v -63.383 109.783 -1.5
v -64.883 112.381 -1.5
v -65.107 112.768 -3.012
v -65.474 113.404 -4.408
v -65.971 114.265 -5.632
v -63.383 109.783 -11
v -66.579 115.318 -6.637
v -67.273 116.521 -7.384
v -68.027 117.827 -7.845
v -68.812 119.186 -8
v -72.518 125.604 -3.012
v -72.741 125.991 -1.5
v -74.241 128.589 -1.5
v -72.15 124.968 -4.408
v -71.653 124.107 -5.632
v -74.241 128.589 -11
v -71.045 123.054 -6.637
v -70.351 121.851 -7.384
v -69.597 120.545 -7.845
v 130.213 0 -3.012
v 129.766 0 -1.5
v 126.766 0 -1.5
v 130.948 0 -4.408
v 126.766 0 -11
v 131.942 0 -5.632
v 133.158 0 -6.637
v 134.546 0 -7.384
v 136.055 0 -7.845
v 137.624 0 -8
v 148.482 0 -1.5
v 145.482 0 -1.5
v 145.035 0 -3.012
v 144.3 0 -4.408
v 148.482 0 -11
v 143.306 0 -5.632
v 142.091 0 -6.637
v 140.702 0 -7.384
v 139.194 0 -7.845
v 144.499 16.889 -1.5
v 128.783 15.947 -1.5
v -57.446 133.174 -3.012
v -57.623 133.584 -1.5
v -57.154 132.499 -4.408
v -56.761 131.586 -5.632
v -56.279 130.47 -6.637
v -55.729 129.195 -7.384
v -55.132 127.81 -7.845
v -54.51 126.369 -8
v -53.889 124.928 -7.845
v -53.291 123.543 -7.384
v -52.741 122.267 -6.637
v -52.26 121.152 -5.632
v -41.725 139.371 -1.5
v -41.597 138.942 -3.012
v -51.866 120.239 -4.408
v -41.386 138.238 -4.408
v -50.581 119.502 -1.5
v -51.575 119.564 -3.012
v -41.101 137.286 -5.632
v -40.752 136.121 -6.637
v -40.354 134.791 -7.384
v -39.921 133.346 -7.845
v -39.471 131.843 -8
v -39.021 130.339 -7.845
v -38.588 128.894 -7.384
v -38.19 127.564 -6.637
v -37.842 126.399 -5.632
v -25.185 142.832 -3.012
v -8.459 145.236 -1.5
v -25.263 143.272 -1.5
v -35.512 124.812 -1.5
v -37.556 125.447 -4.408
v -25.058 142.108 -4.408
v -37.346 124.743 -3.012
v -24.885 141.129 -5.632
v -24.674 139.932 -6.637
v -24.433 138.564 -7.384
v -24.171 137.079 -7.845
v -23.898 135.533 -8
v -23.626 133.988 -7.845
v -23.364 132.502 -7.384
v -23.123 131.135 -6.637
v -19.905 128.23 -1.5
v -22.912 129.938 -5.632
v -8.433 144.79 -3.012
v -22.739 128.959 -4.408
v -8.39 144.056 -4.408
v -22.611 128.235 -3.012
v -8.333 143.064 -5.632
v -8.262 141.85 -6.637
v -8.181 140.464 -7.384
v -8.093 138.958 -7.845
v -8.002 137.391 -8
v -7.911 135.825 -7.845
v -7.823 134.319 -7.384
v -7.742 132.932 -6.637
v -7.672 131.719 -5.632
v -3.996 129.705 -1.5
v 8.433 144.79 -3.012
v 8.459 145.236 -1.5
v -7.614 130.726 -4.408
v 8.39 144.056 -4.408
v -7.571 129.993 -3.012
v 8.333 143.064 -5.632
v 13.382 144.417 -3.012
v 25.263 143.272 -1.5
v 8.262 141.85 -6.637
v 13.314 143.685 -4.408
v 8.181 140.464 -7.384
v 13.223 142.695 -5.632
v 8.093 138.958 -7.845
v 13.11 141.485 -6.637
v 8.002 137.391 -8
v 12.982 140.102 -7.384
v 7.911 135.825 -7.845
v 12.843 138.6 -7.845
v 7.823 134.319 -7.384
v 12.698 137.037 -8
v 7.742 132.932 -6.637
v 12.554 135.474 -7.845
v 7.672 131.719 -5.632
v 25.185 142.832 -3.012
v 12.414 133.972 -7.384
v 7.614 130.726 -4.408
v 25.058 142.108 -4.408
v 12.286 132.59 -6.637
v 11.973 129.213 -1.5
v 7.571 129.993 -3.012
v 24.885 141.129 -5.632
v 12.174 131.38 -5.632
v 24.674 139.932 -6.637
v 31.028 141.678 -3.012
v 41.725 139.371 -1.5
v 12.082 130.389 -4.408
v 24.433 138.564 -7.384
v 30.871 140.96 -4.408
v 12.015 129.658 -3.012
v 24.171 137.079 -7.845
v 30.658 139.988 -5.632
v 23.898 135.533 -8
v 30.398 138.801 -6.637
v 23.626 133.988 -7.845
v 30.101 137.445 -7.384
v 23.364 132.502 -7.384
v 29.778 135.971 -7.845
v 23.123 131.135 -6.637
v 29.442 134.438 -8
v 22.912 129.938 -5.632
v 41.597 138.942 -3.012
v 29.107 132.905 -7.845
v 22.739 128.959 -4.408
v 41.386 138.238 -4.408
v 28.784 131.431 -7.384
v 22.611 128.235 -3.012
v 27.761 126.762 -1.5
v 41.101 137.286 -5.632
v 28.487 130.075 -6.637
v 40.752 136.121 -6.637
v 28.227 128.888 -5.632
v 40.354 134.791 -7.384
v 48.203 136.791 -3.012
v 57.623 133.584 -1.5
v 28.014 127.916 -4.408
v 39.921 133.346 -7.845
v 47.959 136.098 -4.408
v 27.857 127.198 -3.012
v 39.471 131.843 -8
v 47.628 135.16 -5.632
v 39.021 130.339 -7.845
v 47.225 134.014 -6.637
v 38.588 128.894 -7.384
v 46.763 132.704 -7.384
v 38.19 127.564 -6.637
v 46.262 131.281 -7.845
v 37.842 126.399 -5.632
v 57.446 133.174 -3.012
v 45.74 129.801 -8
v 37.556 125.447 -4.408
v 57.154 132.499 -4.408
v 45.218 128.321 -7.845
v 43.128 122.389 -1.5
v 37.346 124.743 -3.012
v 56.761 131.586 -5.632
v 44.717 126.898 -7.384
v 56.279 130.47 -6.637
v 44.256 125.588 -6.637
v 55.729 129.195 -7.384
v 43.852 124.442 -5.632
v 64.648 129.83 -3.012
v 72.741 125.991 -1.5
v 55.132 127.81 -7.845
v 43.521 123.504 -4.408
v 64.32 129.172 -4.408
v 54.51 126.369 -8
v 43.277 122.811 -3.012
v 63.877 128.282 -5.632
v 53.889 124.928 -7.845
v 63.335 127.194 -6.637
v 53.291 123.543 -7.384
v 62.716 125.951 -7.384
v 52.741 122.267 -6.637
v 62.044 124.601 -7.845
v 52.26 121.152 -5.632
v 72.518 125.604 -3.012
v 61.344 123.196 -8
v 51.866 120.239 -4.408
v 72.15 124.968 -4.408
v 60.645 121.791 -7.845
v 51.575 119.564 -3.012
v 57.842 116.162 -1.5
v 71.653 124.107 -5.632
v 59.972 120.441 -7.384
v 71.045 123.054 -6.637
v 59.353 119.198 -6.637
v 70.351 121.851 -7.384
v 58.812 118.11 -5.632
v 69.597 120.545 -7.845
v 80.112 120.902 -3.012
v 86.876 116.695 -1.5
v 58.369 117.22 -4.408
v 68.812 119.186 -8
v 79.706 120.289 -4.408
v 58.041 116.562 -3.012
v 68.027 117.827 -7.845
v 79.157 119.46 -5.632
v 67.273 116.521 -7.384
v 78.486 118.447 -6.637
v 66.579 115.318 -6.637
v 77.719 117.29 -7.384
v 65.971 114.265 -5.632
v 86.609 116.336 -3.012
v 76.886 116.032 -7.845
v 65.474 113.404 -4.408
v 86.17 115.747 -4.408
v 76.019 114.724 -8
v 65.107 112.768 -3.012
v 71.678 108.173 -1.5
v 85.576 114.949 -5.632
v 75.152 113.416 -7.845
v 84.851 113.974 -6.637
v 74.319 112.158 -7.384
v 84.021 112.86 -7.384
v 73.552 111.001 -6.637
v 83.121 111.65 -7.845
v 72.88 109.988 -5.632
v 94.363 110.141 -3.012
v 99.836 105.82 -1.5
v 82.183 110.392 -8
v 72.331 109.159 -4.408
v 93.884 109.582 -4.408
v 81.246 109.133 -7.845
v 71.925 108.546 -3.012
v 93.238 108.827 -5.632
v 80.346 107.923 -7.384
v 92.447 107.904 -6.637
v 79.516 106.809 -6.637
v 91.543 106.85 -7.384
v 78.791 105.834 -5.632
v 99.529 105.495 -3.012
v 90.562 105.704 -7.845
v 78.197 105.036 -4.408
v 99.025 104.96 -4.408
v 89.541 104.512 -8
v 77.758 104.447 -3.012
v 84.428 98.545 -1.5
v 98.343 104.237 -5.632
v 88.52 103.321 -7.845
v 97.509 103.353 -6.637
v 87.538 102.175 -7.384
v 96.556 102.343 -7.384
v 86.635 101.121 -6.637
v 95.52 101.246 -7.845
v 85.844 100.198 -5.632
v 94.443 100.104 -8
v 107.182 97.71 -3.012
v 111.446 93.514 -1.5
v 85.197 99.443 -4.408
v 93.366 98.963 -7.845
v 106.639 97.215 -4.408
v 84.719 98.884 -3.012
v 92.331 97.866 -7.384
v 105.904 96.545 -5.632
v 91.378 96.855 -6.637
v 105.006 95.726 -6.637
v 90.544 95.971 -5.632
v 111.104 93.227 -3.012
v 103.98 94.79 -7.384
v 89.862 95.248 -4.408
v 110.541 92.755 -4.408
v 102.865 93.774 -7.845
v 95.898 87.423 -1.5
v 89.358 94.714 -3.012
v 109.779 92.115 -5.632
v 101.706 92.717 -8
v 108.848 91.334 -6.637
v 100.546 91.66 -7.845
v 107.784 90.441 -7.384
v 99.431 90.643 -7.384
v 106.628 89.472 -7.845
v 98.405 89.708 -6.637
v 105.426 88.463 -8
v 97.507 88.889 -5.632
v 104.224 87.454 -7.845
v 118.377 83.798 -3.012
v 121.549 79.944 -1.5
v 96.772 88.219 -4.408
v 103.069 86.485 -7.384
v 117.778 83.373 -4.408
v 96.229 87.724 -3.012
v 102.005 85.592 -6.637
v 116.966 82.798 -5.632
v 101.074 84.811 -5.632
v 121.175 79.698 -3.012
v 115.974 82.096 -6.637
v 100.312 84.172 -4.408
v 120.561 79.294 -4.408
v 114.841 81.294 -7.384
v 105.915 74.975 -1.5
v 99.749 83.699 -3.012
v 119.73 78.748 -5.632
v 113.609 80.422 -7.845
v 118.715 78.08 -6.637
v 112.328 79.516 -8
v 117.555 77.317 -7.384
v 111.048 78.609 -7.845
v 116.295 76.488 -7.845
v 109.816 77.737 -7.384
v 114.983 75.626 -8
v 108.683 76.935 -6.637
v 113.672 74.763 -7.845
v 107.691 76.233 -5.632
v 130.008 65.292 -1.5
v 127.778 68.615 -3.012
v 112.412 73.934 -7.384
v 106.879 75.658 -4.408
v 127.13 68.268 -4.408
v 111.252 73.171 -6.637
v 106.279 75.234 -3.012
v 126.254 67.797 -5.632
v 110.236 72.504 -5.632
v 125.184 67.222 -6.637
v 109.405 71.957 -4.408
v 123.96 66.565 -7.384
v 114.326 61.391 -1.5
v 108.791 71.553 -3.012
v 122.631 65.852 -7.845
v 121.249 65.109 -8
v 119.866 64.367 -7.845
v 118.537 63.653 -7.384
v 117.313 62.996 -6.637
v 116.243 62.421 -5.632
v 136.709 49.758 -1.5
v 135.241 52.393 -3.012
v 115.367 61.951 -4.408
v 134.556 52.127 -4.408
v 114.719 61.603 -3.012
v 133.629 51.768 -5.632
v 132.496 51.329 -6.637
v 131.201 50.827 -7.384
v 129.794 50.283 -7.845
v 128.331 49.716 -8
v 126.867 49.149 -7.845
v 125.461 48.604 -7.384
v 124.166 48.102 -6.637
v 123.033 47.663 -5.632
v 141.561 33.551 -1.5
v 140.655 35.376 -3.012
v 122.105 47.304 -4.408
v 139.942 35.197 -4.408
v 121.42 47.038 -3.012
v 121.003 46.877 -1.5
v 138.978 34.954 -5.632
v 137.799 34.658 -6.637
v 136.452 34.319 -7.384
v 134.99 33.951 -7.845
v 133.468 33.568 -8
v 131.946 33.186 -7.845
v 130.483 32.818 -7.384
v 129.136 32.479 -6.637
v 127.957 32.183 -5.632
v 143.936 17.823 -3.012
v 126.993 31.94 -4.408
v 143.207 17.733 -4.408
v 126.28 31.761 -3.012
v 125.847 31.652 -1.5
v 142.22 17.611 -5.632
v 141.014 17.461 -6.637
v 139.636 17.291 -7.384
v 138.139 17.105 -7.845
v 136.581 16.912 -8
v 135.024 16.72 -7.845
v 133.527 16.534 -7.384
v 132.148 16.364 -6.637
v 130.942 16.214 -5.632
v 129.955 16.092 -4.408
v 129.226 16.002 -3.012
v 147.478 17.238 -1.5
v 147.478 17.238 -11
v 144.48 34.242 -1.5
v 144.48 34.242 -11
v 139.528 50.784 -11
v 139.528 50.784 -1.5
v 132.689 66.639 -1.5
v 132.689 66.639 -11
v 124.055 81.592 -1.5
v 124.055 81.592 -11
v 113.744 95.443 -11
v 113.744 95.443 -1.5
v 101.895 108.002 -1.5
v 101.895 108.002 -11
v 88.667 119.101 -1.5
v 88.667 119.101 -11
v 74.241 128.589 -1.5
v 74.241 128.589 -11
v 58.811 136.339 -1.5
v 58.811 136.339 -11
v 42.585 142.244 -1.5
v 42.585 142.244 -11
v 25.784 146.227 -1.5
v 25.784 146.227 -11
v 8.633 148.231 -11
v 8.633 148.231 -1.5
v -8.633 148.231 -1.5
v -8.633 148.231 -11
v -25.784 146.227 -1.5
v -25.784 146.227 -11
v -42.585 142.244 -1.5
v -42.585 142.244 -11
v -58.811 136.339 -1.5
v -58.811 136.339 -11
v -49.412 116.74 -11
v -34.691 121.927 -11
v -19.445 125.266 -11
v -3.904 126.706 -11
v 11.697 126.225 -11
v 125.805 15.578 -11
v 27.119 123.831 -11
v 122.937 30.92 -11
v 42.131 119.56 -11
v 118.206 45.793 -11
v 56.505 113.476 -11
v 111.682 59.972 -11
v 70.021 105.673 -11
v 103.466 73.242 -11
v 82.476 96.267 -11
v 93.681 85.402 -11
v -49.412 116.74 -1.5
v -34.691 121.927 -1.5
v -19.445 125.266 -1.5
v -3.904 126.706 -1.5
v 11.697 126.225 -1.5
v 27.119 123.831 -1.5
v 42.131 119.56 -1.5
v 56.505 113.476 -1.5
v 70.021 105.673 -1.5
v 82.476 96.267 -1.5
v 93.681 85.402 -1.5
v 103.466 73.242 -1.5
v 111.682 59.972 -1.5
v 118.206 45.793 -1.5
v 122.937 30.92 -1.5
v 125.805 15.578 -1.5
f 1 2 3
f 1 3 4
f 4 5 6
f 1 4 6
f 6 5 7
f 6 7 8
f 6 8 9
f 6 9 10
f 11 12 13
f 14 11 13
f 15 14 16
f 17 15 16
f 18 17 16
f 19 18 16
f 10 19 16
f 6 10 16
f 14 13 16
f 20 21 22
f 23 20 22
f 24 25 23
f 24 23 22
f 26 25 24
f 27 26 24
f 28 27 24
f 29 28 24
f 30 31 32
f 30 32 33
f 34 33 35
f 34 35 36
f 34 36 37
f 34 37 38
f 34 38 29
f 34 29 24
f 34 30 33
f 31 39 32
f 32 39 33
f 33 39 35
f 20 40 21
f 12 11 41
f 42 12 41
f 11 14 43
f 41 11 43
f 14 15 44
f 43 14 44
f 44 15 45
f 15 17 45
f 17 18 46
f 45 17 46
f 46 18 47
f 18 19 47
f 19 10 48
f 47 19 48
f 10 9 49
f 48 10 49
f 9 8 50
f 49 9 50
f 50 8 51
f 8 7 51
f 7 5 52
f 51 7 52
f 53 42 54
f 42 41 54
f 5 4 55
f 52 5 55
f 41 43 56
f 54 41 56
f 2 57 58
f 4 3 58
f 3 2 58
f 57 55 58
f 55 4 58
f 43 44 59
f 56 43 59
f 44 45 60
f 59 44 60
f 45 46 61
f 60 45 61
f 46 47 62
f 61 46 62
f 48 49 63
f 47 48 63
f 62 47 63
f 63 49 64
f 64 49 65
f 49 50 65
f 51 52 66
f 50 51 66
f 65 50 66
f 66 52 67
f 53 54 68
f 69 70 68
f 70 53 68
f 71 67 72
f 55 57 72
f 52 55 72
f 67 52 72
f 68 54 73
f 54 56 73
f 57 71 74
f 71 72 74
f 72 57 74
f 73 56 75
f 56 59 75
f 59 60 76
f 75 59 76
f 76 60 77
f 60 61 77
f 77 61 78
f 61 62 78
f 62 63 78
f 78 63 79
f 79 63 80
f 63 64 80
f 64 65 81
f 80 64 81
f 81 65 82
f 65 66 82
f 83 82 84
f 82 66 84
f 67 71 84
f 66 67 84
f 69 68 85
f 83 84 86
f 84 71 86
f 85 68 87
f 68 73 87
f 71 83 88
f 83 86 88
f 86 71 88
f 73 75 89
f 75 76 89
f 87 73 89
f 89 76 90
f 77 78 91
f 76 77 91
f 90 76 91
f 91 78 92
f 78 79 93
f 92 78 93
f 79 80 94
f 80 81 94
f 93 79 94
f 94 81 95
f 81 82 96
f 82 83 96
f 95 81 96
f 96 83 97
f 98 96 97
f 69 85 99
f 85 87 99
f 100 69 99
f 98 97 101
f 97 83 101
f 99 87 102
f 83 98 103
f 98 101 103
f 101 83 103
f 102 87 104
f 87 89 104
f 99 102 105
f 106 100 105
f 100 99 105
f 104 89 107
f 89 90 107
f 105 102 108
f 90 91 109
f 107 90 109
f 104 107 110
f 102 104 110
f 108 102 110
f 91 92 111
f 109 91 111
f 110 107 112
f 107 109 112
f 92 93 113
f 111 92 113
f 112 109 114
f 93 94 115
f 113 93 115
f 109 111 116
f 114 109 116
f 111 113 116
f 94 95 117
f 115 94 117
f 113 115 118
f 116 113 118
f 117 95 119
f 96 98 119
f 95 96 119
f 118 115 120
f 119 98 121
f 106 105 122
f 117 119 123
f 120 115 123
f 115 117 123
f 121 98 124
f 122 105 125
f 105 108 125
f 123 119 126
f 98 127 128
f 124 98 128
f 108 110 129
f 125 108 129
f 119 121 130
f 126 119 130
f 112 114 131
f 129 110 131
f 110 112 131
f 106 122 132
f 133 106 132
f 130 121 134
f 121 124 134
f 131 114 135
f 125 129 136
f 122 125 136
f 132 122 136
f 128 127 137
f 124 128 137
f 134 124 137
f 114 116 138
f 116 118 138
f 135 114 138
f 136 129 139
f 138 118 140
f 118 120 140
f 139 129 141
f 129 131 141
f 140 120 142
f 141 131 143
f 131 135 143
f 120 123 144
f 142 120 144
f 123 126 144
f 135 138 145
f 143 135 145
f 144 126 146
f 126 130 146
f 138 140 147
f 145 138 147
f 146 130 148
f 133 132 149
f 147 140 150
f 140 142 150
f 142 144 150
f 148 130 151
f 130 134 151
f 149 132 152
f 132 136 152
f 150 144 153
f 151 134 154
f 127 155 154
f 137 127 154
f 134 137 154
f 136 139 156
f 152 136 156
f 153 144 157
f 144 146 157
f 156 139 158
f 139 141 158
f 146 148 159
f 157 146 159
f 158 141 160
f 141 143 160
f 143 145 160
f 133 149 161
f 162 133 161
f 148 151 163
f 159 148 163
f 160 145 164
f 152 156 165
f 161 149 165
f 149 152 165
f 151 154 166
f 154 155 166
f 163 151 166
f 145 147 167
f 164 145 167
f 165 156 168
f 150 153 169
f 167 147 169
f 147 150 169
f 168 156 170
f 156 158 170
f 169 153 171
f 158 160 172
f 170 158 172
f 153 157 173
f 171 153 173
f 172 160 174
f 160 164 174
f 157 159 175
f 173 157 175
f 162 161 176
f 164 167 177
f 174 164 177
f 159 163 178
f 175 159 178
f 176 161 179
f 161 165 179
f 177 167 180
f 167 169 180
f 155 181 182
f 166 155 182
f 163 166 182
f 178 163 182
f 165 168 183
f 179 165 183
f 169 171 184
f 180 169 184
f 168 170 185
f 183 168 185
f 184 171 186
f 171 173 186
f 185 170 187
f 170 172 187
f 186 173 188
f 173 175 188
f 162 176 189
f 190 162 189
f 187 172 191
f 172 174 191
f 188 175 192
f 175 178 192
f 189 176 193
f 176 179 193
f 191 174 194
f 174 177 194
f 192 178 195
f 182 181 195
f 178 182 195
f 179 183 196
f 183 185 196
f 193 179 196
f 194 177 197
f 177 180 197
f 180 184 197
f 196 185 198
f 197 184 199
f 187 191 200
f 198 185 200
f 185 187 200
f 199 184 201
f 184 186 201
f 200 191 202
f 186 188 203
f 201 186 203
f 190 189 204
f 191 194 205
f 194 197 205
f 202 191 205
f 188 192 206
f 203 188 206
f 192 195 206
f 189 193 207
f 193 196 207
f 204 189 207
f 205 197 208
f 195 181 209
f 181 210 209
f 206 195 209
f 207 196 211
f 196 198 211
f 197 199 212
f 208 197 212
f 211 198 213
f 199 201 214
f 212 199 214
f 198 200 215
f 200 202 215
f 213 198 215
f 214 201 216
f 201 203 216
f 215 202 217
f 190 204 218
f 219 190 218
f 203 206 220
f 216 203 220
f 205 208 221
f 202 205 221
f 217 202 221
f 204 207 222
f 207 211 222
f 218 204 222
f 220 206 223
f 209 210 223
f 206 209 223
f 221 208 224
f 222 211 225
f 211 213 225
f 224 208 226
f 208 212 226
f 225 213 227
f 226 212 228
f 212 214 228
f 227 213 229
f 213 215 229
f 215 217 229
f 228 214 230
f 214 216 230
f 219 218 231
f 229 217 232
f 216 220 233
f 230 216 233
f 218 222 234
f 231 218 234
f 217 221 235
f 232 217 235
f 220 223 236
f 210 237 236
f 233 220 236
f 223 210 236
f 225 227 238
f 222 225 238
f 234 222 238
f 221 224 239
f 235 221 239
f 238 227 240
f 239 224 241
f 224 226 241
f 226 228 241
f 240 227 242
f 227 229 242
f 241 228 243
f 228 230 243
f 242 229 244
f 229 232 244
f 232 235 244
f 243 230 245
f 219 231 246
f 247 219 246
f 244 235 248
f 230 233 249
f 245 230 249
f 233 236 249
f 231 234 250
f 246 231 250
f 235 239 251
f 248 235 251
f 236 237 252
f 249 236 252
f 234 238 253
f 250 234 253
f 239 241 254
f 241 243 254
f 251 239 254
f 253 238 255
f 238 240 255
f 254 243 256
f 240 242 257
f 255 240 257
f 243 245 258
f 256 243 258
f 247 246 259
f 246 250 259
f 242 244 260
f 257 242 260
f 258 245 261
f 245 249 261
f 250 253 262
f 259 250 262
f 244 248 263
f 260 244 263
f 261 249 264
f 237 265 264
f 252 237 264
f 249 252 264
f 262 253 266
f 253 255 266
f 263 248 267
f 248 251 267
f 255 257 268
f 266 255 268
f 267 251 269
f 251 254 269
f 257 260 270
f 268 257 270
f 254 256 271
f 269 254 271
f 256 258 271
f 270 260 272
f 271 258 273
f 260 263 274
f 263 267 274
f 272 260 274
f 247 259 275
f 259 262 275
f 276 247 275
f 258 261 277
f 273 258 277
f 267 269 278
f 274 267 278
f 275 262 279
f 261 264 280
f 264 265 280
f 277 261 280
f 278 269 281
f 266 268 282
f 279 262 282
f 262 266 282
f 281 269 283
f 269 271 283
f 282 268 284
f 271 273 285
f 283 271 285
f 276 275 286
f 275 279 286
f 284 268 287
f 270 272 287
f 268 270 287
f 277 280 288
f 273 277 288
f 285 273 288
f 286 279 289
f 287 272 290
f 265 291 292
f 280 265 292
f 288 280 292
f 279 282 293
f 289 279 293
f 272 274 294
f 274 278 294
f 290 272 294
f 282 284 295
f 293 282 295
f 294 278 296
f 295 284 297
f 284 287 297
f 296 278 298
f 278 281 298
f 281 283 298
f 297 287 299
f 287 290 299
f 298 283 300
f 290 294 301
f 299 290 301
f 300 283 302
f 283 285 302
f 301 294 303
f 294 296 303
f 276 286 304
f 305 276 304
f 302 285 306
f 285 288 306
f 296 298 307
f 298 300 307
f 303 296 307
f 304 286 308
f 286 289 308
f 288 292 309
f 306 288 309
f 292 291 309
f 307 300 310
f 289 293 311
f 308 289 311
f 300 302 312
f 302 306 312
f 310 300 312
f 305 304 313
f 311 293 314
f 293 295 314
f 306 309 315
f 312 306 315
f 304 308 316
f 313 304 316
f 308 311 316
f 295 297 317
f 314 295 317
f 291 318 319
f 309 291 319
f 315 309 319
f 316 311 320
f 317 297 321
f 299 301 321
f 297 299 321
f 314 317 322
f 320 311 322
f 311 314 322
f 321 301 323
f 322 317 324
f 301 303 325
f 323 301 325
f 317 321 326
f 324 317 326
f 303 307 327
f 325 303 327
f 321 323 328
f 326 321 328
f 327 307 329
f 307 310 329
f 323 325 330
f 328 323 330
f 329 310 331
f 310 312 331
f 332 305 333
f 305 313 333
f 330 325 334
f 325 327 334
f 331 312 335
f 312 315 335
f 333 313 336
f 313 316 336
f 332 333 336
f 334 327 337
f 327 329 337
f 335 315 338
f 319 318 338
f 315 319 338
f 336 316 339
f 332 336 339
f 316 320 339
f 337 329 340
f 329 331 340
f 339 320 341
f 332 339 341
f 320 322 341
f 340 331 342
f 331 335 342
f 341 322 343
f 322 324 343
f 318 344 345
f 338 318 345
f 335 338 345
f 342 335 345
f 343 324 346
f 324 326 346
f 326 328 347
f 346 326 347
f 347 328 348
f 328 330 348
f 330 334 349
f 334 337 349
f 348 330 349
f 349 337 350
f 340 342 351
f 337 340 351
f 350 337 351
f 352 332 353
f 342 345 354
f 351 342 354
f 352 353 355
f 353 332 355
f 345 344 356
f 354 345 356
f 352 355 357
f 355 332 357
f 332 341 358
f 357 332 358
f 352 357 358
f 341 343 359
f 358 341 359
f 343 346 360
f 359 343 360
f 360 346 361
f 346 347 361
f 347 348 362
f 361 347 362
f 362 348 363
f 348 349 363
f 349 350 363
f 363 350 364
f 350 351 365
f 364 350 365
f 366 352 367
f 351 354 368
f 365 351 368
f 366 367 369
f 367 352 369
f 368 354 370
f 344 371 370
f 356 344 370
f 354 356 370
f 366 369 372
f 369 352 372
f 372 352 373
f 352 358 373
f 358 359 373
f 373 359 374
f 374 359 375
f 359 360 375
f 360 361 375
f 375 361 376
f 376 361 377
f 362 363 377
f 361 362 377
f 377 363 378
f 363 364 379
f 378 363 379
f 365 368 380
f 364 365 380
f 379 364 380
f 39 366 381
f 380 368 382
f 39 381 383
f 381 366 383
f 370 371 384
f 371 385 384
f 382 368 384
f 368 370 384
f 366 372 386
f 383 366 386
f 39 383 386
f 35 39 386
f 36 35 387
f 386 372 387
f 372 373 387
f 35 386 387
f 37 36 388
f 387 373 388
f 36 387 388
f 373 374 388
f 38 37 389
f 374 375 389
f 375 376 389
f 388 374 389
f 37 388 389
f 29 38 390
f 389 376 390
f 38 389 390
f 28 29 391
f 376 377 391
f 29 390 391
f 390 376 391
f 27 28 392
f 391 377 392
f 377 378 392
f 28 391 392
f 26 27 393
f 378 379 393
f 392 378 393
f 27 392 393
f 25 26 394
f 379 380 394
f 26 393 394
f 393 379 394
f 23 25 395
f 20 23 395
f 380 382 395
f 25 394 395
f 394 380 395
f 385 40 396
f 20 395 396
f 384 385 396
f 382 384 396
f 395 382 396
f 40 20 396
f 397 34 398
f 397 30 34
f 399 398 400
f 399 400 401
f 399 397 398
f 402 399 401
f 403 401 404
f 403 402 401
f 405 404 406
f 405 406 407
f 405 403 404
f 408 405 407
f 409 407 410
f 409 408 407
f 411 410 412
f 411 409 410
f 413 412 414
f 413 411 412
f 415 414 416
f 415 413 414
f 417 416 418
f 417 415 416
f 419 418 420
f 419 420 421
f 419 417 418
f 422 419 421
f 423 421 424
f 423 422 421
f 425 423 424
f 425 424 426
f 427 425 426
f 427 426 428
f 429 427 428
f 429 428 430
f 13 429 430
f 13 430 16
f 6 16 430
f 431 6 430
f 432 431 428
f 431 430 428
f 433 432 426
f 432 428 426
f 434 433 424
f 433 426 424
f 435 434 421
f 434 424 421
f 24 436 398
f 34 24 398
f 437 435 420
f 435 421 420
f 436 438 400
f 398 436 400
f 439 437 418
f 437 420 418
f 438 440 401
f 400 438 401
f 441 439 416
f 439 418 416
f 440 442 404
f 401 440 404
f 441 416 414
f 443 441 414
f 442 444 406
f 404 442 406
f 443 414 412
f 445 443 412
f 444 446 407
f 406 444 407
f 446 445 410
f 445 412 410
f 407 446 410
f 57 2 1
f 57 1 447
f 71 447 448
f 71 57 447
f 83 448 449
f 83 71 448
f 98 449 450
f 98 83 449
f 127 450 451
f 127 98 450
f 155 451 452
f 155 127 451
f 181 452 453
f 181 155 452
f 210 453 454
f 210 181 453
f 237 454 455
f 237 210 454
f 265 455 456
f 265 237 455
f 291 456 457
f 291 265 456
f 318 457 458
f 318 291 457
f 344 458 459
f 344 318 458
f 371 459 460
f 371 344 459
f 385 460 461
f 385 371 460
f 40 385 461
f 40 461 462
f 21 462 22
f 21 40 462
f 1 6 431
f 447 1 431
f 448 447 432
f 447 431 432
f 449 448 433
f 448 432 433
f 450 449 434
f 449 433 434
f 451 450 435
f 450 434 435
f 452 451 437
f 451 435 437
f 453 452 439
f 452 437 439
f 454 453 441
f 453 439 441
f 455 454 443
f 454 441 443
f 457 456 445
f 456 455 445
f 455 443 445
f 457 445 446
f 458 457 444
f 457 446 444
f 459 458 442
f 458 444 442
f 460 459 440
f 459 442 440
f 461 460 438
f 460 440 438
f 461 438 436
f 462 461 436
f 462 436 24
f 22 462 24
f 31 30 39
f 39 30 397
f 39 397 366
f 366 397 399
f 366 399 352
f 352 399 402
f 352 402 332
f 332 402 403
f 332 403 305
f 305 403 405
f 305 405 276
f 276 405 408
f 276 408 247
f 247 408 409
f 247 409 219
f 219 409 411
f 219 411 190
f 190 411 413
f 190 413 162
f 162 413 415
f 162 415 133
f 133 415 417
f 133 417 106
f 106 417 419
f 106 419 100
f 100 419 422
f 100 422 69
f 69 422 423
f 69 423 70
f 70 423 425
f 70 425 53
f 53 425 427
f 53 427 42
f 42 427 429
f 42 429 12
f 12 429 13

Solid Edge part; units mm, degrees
sketch "Sketch1" plane through (0, 0, 0) normal (0, -1, 0) x (1, 0, 0)
  line L0 (129.7661, -1.5) -> (126.7661, -1.5)
  line L1 (126.7661, -1.5) -> (126.7661, -11)
  line L2 (126.7661, -11) -> (148.4823, -11)
  line L3 (148.4823, -11) -> (148.4823, -1.5)
  line L4 (148.4823, -1.5) -> (145.4823, -1.5)
  arc A0 (145.4823, -1.5) -> (129.7661, -1.5) centre (137.6242, 0) cw
  dimension "D1" = 3
  dimension "D2" = 3
  dimension "D3" = 11
  dimension "D4" = 1.5
  dimension "D5" = 16
revolve "RevolvedProtrusion_2" add sketch "Sketch1" angle 120 about axis through (0, 0, 0) along (0, 0, 1)
properties material "ABS Plastic, high impact"
